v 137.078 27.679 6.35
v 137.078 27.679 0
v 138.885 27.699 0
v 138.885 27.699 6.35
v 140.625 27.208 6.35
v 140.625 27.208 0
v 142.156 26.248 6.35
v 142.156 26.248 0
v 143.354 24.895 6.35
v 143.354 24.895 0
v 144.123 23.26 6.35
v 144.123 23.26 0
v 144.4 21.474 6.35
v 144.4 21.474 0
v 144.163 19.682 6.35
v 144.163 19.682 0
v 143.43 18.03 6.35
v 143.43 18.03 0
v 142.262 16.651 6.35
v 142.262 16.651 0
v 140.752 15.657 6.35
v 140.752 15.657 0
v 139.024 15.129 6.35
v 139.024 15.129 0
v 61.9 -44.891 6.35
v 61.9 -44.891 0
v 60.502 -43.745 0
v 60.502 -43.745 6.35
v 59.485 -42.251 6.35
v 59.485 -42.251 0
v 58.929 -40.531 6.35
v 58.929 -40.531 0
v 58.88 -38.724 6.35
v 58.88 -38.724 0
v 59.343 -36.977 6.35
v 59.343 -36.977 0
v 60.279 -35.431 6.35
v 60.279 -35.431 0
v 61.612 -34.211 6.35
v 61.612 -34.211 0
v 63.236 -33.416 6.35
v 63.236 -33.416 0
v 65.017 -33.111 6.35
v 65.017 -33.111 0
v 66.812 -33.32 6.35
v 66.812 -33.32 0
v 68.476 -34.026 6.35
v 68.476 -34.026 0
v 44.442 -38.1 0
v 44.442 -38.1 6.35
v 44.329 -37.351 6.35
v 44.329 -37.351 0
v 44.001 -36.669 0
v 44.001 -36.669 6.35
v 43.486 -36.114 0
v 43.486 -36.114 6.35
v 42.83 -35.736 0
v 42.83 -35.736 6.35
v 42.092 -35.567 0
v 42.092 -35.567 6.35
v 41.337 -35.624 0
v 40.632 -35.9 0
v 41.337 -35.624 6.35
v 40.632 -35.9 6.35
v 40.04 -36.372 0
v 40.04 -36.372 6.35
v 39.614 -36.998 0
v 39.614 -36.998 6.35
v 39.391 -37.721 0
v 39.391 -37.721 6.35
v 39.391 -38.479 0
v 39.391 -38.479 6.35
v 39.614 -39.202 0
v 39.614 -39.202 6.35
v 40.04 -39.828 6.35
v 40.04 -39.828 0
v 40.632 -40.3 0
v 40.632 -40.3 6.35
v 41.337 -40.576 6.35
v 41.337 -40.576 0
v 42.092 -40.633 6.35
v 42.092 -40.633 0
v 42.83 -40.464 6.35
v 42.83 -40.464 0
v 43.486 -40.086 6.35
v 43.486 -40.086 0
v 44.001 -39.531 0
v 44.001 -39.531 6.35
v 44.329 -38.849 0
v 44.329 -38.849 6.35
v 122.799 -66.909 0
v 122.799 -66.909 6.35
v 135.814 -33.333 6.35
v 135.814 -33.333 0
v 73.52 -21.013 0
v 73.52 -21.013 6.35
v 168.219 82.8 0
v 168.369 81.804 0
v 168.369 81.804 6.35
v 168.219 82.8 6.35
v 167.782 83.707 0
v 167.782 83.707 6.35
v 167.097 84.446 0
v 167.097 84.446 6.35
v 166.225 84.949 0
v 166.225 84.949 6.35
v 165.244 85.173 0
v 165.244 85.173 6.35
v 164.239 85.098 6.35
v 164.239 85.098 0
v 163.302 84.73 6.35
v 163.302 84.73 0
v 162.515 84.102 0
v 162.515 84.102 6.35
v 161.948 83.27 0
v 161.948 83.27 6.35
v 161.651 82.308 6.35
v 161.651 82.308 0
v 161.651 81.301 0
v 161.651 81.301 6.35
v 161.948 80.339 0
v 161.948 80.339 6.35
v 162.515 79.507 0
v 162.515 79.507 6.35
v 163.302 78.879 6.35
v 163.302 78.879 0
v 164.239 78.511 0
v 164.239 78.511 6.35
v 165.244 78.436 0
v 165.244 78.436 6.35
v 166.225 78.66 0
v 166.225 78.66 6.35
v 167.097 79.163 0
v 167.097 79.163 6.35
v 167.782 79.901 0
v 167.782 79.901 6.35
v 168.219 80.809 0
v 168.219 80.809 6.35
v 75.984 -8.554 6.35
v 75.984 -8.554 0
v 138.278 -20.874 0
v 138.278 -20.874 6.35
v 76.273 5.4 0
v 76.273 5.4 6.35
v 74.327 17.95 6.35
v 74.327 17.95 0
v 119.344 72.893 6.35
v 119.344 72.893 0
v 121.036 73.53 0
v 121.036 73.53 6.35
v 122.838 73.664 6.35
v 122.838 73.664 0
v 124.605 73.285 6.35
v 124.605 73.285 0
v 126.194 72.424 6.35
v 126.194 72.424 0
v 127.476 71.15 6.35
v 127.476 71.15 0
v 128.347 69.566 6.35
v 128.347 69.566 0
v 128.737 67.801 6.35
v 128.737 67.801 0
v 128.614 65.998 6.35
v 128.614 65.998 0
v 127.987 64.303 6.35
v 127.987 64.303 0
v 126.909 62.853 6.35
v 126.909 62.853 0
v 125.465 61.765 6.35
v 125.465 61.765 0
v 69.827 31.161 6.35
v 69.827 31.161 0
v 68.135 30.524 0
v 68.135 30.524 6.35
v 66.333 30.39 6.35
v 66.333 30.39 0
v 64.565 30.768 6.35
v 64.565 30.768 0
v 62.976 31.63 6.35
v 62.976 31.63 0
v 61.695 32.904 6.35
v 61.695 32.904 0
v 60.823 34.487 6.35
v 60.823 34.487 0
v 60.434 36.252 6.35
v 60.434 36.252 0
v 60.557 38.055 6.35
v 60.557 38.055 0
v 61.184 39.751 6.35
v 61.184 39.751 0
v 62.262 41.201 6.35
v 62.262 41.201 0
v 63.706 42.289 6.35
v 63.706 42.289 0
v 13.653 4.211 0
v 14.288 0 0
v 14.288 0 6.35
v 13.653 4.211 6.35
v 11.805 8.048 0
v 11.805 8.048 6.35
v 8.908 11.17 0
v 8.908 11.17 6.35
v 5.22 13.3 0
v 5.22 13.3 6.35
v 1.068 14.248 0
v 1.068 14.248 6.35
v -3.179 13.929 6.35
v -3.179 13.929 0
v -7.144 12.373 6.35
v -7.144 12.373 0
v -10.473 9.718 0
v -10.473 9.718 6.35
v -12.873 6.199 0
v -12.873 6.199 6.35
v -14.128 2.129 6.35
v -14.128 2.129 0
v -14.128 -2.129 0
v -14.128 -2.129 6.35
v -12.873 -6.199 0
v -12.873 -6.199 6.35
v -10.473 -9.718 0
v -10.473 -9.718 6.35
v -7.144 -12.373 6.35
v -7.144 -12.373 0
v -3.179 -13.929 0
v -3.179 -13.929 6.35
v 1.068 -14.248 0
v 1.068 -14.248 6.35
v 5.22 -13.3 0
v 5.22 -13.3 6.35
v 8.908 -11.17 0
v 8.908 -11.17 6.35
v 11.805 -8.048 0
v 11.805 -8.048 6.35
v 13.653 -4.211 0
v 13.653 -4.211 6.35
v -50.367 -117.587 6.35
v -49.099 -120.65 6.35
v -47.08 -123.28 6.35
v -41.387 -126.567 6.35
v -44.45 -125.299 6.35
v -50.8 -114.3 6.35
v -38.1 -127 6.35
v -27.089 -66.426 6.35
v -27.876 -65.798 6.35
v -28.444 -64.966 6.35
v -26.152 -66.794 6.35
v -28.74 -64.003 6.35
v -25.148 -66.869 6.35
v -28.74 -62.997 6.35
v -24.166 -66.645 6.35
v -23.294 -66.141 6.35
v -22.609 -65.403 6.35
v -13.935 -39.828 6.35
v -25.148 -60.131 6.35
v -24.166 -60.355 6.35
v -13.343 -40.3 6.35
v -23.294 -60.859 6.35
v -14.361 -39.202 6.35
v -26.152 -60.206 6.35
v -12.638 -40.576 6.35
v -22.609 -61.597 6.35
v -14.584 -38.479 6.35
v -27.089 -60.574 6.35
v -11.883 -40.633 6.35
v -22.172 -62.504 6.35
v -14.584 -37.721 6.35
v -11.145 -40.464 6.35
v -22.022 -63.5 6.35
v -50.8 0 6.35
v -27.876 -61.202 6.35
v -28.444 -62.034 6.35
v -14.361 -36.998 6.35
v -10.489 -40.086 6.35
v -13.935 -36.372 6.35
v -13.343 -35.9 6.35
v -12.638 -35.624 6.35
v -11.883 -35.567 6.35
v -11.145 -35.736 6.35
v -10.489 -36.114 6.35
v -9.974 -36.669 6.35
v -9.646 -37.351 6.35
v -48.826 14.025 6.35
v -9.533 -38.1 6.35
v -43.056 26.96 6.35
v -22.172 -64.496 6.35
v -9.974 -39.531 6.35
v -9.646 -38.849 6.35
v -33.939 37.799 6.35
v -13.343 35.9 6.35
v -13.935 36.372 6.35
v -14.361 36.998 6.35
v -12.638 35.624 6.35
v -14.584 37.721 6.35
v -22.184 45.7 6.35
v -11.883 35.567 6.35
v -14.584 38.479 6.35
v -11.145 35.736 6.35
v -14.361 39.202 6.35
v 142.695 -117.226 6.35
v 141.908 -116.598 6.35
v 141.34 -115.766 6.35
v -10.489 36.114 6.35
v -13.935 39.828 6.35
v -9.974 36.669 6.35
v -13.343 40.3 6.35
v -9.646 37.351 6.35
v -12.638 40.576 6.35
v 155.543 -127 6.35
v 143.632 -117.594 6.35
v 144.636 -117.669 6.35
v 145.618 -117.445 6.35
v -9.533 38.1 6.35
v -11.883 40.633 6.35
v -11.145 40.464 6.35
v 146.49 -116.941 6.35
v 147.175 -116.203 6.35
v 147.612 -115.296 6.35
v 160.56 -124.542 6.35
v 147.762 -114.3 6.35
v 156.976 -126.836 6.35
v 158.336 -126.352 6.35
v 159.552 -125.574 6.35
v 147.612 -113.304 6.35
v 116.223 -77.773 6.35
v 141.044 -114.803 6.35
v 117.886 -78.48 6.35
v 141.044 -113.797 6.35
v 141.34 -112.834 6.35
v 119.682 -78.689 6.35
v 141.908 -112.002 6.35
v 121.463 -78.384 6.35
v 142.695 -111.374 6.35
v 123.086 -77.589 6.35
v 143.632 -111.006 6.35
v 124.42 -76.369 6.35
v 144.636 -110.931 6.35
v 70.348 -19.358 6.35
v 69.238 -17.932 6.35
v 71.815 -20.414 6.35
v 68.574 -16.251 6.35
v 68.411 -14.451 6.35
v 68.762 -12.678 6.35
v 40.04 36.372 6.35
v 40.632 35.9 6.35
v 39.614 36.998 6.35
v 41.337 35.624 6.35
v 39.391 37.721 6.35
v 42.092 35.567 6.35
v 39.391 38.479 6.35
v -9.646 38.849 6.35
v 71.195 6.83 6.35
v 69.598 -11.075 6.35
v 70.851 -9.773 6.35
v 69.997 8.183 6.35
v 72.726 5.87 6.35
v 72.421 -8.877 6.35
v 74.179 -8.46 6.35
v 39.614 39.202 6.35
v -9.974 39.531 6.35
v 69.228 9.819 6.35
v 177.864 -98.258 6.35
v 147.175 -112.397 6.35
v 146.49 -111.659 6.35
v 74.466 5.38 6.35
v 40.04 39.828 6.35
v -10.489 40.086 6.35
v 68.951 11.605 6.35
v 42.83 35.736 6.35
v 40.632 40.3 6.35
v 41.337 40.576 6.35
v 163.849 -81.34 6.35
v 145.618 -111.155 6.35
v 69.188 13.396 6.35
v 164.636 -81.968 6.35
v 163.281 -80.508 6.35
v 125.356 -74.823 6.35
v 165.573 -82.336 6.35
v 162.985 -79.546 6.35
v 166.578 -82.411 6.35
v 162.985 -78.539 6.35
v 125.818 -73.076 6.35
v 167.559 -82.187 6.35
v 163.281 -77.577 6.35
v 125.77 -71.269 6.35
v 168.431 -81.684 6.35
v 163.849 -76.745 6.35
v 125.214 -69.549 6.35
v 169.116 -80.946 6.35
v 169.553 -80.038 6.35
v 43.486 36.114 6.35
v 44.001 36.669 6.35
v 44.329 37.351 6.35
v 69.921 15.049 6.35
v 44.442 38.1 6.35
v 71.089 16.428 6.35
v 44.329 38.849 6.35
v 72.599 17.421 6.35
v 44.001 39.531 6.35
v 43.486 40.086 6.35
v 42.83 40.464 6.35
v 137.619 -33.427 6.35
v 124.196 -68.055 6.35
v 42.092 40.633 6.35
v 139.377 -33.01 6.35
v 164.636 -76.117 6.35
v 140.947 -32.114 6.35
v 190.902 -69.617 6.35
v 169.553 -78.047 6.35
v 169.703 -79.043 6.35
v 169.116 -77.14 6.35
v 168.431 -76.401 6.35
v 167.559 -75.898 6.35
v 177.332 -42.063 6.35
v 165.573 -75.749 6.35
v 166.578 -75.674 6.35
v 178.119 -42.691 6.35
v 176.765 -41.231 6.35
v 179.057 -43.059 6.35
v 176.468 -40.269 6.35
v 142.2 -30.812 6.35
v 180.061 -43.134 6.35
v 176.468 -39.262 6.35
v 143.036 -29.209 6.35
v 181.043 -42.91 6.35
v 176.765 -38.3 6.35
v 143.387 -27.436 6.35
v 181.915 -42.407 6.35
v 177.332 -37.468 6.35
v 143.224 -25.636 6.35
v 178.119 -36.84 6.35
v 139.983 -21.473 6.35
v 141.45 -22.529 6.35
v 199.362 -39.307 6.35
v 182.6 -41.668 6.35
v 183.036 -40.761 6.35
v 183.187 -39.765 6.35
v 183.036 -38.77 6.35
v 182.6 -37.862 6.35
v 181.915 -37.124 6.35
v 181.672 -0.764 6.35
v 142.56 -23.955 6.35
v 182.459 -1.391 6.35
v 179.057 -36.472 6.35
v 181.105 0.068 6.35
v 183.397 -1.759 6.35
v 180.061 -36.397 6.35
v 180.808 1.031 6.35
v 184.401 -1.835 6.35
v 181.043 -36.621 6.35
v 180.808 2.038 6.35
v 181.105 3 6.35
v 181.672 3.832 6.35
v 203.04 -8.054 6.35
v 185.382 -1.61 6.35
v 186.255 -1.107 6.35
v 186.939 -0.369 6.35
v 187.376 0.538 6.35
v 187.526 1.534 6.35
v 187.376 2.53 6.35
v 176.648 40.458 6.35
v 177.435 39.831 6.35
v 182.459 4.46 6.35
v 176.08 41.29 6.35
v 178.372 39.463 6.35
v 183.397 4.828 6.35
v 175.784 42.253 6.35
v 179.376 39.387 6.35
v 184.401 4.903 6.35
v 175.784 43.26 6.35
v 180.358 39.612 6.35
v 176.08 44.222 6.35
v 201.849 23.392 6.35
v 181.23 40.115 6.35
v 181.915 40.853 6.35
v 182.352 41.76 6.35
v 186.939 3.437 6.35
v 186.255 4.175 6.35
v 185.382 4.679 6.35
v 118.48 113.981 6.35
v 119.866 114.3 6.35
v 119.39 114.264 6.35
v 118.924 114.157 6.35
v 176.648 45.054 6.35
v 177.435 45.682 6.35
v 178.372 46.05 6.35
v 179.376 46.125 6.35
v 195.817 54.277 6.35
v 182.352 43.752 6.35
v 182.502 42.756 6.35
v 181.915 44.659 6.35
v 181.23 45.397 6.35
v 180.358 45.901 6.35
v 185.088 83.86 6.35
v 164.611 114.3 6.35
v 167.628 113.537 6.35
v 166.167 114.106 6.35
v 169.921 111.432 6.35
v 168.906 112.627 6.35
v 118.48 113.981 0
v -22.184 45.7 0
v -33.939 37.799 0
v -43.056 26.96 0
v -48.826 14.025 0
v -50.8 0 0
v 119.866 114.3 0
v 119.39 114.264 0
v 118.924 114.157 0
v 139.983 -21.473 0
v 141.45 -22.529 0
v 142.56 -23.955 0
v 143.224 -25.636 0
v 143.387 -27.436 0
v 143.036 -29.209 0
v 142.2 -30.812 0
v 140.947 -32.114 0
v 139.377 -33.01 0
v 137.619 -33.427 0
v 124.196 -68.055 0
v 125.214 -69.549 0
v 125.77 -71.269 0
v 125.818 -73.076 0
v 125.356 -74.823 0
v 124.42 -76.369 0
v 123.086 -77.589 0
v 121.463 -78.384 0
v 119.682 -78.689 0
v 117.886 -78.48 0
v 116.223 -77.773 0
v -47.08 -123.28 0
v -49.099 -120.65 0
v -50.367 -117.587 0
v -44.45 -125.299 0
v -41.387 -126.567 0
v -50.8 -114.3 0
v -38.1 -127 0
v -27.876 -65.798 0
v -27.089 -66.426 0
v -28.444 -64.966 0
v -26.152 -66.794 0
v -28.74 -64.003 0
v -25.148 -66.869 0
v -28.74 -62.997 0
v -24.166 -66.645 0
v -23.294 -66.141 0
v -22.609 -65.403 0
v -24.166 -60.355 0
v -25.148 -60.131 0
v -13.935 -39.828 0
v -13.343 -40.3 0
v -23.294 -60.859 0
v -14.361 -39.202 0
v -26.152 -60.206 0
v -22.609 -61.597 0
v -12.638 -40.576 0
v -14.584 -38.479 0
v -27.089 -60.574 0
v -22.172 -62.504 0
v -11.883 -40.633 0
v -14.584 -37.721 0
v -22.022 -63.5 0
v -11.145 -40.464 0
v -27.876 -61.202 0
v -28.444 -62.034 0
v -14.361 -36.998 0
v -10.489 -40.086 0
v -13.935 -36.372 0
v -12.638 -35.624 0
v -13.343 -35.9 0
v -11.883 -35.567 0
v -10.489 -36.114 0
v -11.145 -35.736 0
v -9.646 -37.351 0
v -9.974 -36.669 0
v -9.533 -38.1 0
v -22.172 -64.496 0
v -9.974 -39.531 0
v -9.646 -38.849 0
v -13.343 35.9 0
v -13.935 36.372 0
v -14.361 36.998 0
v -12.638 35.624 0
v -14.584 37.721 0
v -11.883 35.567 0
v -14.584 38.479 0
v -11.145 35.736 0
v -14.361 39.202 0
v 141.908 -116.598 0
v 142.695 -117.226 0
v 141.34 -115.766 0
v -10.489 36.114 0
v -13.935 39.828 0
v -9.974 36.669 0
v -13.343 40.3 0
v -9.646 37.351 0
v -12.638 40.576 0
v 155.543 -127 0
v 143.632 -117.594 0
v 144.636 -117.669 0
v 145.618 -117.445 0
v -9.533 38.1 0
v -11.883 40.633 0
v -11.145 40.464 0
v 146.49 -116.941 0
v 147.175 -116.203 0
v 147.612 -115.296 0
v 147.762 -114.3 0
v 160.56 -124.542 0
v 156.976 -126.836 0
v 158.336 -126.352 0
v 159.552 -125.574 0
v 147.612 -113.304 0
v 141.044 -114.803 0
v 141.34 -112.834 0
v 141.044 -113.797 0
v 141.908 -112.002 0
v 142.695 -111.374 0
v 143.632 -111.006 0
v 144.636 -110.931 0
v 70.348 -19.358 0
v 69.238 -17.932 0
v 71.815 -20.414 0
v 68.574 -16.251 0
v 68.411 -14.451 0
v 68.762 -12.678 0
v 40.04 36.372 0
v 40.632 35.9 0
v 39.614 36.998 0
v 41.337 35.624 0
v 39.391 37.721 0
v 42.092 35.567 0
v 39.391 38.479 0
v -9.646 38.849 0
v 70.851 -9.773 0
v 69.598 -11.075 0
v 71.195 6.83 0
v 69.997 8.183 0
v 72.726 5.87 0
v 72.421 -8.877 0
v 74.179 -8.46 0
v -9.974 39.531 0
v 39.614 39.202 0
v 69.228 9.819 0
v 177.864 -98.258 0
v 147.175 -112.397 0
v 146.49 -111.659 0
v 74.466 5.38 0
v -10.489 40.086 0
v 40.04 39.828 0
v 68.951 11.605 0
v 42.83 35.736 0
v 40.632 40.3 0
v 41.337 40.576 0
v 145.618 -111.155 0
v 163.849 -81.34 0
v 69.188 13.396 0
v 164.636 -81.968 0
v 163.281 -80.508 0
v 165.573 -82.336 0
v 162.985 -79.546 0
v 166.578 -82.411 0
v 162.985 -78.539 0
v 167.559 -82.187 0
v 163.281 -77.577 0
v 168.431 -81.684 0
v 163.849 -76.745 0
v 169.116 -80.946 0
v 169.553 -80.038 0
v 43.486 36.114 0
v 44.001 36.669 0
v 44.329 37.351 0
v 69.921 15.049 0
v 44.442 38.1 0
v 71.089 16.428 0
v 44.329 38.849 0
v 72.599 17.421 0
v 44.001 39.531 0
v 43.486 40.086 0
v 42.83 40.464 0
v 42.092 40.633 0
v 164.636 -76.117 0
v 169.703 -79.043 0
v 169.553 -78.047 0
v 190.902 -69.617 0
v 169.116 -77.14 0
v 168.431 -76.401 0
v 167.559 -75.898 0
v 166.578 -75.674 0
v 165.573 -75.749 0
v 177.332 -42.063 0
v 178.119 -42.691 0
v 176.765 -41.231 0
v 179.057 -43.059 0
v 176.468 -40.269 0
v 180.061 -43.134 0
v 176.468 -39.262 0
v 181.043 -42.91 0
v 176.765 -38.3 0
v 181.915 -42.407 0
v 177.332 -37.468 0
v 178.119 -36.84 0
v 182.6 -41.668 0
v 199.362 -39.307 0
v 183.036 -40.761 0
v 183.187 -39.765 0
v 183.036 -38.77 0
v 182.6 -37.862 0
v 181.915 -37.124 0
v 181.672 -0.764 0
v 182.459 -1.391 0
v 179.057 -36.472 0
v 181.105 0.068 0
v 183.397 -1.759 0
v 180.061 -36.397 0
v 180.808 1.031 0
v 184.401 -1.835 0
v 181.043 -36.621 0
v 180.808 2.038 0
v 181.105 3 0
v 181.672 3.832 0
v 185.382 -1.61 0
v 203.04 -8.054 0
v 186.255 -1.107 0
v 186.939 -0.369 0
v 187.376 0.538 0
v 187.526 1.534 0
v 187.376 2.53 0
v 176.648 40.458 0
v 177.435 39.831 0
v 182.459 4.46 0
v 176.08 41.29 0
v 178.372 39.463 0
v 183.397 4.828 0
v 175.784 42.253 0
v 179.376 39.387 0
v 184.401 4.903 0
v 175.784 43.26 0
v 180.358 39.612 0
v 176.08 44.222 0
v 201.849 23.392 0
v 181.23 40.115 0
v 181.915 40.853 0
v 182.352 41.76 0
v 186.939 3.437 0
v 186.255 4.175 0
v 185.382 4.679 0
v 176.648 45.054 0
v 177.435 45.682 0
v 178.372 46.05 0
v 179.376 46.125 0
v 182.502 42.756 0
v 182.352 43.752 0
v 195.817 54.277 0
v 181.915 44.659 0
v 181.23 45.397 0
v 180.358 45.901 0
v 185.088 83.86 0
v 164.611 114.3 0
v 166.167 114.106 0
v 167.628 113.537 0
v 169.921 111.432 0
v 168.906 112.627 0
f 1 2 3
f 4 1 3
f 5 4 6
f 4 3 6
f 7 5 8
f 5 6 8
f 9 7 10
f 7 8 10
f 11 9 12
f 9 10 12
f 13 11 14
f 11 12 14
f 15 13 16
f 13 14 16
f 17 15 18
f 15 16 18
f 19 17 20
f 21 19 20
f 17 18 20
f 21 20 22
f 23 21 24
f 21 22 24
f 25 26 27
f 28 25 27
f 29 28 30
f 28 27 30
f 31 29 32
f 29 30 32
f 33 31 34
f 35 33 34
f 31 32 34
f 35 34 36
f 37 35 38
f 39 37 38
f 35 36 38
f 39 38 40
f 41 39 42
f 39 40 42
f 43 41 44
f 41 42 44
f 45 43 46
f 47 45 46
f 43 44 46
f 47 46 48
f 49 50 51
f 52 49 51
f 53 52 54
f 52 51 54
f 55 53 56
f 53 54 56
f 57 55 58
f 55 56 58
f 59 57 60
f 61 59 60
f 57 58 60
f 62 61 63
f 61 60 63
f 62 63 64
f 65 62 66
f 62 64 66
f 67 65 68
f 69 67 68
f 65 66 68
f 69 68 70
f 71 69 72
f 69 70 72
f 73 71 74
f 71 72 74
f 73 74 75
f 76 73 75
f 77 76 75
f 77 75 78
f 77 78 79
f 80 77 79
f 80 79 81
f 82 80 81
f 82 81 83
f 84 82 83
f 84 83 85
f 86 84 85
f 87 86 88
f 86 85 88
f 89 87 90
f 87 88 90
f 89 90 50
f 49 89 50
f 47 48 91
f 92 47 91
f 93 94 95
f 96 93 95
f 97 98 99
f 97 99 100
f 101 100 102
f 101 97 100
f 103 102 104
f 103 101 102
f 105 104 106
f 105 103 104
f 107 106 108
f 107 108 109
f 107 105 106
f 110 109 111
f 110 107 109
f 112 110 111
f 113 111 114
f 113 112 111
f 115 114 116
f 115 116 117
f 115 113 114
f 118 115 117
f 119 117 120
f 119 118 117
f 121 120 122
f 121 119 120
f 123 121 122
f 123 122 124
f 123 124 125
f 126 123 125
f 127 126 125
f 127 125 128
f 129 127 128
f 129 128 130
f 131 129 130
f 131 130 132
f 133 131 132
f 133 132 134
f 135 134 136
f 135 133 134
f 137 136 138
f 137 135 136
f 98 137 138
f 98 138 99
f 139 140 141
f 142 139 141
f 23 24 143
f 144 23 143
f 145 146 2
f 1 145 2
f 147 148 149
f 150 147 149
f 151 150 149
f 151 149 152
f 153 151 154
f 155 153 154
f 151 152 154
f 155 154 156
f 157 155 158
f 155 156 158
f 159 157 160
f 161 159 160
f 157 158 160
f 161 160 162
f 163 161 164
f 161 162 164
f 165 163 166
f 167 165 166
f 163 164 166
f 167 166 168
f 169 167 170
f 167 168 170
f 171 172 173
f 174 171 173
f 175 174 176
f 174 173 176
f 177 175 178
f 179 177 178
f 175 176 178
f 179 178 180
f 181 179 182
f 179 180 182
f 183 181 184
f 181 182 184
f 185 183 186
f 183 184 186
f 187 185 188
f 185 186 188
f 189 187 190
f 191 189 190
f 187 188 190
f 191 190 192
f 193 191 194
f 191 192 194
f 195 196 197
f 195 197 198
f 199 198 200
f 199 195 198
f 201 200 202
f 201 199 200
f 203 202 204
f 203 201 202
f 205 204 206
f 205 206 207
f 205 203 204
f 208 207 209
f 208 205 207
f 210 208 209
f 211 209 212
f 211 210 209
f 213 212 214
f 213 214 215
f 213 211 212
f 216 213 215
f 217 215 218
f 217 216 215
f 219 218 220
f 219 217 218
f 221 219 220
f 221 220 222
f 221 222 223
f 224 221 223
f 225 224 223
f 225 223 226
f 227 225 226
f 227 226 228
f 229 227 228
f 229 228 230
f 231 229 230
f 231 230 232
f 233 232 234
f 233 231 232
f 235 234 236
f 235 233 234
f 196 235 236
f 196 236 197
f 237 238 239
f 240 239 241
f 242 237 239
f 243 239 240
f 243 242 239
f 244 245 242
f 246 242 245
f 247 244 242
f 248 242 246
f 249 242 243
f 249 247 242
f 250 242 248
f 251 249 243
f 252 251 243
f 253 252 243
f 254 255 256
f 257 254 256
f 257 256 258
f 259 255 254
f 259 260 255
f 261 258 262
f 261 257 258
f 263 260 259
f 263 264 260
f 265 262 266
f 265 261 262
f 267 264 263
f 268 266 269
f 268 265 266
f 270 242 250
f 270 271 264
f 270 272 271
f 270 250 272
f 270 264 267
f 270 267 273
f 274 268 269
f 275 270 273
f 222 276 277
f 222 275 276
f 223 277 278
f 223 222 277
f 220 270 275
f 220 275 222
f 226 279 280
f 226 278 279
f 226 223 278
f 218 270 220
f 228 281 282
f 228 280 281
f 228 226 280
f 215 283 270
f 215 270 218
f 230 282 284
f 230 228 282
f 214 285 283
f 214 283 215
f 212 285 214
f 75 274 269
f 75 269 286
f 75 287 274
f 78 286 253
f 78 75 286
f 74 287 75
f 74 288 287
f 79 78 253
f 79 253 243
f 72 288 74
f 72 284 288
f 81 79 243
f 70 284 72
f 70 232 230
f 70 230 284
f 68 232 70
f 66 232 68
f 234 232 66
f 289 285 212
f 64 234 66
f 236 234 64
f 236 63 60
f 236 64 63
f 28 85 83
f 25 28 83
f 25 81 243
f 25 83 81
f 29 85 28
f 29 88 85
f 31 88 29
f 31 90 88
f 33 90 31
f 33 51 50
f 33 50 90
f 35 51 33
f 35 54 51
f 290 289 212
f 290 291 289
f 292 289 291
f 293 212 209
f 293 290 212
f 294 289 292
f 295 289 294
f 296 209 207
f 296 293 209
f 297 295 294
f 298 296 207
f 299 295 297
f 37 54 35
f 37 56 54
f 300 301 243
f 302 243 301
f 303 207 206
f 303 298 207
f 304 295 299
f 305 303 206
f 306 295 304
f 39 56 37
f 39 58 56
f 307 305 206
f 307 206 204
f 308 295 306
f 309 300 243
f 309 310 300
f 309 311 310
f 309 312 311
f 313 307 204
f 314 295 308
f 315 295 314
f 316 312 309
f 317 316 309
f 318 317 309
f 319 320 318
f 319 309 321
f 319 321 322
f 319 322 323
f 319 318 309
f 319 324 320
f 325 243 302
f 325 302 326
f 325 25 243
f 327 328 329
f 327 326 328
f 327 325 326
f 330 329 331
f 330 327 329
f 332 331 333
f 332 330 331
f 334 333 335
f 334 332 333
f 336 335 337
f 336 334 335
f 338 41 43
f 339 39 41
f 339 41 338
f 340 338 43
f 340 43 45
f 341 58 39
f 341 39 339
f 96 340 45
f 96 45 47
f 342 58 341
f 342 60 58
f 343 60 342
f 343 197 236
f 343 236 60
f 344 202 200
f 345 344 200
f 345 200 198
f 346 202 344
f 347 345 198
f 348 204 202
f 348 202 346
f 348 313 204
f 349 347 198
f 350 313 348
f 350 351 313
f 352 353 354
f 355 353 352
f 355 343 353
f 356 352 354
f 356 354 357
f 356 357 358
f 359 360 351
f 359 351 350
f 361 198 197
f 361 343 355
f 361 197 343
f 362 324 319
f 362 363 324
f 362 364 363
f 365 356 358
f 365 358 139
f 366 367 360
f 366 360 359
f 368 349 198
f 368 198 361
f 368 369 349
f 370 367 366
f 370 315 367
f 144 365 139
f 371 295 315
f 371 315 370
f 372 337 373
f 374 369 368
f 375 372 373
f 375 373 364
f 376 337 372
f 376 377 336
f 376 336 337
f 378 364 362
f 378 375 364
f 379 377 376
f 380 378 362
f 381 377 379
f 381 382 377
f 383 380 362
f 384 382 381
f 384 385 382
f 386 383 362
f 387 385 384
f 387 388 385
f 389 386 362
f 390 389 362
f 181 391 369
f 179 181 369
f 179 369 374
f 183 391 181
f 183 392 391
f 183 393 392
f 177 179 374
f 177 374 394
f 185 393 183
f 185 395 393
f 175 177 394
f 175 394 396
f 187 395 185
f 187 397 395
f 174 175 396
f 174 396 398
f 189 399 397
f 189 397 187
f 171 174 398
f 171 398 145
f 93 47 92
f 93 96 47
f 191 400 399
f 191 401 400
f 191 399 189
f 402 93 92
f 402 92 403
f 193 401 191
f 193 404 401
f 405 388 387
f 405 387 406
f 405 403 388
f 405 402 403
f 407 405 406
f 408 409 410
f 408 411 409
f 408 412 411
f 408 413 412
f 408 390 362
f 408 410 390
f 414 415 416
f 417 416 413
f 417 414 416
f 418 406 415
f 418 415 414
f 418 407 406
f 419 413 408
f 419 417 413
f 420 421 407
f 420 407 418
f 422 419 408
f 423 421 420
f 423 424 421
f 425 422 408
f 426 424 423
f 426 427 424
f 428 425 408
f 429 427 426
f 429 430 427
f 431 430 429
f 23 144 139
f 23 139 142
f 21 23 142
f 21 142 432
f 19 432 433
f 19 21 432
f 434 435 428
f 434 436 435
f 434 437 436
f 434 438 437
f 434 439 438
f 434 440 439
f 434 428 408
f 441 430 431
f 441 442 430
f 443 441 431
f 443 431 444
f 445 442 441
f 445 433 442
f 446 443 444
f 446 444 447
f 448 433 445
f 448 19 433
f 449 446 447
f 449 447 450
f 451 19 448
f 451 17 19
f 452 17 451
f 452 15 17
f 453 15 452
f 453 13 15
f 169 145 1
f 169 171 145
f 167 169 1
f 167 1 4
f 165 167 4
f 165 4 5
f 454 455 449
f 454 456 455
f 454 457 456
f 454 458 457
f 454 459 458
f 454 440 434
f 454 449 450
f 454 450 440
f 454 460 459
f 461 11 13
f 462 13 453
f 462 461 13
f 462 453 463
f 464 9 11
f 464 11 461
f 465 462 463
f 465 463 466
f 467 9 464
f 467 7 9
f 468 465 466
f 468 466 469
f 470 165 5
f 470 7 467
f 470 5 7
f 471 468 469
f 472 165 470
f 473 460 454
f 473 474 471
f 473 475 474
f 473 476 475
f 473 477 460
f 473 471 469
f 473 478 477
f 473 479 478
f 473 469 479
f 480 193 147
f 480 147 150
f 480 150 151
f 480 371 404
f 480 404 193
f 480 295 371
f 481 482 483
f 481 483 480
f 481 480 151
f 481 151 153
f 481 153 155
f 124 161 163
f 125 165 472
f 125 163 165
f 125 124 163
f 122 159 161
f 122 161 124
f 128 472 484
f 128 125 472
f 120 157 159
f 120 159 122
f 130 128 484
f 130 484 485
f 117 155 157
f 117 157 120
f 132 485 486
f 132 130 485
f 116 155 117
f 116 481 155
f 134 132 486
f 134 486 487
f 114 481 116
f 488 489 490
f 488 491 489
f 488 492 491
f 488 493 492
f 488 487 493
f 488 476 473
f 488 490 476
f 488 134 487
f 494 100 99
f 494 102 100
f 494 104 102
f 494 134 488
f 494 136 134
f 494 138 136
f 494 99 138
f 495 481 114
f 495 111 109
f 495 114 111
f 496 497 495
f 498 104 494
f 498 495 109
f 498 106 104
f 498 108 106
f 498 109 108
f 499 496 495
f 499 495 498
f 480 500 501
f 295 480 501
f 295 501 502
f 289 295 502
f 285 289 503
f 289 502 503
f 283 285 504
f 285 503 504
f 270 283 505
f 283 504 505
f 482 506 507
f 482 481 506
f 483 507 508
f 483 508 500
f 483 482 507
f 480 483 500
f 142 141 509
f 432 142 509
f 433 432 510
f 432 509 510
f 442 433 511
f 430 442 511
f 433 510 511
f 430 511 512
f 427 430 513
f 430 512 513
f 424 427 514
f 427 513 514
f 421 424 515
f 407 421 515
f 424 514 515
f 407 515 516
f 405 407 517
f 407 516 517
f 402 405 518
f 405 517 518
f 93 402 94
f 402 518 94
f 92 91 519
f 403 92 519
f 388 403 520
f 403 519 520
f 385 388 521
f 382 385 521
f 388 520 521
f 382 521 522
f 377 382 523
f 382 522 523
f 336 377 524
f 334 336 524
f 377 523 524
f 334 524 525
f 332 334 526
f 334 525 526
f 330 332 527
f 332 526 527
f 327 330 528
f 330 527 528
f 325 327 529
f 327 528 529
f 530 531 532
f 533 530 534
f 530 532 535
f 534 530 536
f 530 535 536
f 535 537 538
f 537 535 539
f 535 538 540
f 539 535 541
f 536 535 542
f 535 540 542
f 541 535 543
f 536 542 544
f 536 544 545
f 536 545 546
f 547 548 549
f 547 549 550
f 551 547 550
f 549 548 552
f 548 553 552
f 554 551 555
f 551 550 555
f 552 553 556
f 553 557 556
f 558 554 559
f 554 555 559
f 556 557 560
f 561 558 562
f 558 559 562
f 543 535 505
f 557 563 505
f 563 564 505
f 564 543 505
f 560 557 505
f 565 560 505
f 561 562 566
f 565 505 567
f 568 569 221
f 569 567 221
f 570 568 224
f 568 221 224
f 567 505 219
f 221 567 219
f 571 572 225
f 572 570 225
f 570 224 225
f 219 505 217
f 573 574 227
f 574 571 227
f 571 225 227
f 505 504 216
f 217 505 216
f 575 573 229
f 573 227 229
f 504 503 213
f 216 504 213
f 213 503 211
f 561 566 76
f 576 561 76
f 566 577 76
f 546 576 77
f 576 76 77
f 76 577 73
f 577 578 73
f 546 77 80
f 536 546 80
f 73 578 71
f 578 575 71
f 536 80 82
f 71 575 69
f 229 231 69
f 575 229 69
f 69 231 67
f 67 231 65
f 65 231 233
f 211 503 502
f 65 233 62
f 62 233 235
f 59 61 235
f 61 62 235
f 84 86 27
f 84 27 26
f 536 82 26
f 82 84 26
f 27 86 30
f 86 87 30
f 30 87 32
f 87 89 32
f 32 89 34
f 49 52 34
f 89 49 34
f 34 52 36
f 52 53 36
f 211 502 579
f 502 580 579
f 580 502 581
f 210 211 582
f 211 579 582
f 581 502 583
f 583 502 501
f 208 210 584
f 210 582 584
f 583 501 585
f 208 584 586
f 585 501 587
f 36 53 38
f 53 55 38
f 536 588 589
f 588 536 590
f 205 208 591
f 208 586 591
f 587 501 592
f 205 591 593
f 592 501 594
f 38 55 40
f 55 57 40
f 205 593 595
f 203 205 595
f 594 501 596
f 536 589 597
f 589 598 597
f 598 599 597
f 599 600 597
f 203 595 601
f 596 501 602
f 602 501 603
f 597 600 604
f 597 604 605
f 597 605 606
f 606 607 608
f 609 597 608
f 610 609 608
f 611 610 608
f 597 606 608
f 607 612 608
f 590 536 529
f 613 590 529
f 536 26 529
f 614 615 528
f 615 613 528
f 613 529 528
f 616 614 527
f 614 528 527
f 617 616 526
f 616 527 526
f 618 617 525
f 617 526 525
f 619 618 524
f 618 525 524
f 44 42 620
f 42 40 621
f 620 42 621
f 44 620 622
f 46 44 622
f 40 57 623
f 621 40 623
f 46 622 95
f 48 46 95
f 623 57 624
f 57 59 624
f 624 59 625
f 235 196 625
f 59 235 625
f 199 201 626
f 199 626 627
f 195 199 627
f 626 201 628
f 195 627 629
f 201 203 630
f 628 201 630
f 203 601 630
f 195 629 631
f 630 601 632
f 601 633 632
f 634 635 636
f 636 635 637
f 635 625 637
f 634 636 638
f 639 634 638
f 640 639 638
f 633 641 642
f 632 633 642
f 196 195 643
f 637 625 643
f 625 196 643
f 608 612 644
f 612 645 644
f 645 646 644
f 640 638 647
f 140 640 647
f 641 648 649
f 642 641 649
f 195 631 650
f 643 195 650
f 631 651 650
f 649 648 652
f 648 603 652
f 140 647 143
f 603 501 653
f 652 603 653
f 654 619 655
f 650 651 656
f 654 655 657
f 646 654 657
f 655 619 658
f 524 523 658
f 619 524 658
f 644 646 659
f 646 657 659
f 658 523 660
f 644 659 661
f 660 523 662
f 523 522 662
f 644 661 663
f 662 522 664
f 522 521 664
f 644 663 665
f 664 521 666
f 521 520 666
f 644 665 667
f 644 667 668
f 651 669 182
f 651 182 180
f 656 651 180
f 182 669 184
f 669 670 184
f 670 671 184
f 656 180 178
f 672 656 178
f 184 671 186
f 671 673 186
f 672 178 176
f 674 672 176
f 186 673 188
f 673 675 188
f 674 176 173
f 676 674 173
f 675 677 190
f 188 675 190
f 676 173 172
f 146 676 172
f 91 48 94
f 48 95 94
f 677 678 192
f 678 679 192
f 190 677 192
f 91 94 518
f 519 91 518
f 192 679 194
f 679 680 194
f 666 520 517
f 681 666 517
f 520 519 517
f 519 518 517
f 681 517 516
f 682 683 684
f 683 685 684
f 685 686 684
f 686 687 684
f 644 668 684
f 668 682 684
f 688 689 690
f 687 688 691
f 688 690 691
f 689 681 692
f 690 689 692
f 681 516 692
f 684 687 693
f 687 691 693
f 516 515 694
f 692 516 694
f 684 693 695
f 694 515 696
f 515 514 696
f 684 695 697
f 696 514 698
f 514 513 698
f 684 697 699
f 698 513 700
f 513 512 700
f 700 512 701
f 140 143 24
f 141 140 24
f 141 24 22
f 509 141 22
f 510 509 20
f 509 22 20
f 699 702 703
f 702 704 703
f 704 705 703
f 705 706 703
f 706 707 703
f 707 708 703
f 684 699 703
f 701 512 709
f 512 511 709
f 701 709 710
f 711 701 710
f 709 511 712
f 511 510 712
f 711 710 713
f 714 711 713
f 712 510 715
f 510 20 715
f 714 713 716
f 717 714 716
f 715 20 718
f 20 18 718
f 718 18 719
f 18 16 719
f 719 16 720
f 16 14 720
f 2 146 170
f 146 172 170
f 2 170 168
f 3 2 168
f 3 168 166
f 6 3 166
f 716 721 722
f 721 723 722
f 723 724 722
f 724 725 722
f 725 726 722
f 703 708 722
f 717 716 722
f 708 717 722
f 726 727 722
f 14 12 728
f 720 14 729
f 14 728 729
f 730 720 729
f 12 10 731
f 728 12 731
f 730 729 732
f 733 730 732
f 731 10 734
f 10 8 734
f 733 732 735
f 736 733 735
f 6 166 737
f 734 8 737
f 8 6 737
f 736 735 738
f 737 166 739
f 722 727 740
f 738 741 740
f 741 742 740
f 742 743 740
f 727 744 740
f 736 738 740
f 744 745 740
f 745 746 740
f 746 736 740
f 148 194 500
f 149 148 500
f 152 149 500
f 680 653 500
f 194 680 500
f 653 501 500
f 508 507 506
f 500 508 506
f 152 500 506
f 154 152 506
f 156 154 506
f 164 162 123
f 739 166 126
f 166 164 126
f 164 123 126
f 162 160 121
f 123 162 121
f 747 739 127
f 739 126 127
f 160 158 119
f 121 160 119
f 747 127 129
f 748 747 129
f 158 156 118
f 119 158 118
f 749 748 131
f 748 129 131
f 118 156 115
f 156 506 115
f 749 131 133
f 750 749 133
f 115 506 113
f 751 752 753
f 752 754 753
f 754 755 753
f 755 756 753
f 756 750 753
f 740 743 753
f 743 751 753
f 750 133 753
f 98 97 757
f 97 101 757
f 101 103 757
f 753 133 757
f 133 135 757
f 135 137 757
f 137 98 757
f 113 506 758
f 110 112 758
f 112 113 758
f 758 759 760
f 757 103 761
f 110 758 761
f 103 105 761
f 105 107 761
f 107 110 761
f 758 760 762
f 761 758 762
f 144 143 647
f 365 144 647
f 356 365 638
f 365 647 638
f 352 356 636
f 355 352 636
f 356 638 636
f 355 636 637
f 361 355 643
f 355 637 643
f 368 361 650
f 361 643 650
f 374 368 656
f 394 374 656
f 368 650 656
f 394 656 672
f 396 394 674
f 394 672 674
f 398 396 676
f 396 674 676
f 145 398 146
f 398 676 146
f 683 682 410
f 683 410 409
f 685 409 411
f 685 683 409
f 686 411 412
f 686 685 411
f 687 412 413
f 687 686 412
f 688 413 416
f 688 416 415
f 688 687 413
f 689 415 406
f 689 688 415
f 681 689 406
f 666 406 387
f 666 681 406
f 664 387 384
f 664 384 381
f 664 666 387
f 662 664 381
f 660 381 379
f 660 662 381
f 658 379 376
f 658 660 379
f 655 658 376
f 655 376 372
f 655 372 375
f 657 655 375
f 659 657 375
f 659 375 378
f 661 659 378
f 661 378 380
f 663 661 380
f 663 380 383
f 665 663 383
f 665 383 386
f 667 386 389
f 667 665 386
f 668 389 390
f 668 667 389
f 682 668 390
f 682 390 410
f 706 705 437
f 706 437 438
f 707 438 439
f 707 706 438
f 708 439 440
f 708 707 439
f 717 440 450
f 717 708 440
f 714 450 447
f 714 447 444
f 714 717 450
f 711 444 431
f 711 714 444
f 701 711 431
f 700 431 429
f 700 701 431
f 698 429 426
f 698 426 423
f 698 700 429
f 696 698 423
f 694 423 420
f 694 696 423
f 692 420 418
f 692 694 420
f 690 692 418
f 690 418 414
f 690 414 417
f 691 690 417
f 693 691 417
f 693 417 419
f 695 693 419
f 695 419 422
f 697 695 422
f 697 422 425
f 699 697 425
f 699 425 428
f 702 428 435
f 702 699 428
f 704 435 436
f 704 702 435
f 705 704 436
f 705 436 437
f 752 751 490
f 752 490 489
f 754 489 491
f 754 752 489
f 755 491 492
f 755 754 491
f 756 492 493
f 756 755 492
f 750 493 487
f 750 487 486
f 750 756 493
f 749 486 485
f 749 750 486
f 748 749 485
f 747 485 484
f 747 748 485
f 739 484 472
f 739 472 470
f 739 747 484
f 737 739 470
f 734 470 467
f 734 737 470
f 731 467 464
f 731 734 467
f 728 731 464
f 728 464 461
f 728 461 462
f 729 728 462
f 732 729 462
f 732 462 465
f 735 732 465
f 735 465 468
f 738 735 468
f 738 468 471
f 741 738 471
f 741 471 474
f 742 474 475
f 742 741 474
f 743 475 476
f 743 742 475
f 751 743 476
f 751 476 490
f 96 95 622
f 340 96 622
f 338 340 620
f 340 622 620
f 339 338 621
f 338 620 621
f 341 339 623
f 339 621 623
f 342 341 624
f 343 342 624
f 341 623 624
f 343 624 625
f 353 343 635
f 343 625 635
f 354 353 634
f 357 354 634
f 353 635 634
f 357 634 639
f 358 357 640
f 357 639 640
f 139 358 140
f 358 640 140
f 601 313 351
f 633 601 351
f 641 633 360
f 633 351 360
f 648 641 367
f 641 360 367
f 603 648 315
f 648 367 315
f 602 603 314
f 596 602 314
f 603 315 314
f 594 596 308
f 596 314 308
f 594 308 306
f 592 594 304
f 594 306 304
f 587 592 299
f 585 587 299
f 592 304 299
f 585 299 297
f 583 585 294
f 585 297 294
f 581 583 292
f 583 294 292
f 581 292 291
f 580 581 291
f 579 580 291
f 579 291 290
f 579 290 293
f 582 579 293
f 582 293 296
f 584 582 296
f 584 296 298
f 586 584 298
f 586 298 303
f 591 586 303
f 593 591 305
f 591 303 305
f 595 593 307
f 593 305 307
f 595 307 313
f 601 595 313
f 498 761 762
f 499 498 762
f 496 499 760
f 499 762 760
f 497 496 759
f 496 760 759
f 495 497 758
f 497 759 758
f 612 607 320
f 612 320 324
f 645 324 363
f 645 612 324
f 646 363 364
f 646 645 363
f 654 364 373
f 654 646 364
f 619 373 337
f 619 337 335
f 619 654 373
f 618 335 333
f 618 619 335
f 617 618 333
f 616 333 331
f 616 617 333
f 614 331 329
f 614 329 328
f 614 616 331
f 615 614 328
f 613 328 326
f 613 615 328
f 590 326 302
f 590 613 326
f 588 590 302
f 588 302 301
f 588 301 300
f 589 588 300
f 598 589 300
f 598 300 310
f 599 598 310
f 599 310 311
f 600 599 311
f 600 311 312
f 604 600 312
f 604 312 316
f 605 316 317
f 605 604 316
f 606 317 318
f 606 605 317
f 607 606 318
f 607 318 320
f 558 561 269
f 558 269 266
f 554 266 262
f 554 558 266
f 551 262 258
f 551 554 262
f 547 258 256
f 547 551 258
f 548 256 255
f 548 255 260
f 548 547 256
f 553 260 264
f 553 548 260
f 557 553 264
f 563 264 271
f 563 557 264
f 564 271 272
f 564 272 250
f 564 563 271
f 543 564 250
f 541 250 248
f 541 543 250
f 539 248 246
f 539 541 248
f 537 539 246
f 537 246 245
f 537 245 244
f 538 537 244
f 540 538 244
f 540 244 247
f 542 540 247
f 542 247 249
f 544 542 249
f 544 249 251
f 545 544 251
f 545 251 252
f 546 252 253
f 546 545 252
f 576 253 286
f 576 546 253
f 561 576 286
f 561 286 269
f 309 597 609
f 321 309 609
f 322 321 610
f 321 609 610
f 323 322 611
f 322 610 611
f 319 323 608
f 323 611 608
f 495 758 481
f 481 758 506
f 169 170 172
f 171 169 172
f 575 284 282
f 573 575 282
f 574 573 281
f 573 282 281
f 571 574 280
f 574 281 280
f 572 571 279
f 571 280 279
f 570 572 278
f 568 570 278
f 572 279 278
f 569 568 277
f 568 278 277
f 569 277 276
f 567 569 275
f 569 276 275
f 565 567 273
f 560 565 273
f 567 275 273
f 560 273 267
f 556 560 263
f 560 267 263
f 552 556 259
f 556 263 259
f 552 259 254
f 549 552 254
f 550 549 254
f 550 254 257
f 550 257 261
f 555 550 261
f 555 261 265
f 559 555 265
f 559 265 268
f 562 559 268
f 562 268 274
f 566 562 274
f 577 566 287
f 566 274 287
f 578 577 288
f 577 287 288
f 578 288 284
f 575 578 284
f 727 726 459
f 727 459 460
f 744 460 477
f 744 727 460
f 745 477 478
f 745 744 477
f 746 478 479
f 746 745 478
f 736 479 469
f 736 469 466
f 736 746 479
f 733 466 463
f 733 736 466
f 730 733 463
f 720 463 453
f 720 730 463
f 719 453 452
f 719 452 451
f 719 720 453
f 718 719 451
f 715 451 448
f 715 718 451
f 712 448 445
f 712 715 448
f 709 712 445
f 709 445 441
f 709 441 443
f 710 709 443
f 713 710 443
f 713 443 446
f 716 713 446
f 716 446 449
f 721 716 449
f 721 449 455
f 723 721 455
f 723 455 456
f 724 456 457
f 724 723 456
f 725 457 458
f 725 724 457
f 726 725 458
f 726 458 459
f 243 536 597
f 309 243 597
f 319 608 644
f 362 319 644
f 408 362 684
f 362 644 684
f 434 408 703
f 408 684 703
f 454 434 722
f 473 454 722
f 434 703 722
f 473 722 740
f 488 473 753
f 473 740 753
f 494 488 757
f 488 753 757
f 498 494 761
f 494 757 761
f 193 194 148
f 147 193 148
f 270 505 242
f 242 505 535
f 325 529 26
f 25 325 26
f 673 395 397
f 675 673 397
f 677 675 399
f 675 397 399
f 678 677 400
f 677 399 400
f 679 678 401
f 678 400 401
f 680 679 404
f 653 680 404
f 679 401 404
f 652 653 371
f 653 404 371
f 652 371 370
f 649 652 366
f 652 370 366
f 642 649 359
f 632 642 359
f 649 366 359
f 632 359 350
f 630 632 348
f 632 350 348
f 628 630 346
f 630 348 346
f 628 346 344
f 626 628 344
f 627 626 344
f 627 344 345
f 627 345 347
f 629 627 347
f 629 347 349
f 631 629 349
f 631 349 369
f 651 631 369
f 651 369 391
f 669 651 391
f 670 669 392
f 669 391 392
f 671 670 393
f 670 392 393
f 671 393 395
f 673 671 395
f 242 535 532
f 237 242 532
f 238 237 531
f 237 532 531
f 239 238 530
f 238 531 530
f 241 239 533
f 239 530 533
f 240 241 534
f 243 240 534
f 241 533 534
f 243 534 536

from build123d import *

# Parameters (mm, degrees)
SKETCH1_R           = 3.3782
SKETCH1_R_2         = 14.2875
BOSS_EXTRUDE1_DEPTH = 6.35
FILLET1_R           = 3.175
SKETCH2_R           = 2.54
CUT_EXTRUDE1_DEPTH  = 6.35


with BuildPart() as part:
    # Sketch1 → Boss-Extrude1 (new body)
    with BuildSketch(Plane.XY):
        with BuildLine():
            ThreePointArc((155.542598667, -127), (158.336226208, -126.352468339), (160.56010185, -124.541935484))
            ThreePointArc((160.56010185, -124.541935484), (203.040311847, -8.054301034), (169.920839989, 111.432258065))
            ThreePointArc((169.920839989, 111.432258065), (167.628276357, 113.537255082), (164.61081374, 114.3))
            Line((164.61081374, 114.3), (119.1365603, 114.3))
            Line((119.1365603, 114.3), (-22.183826694, 45.70030452))
            ThreePointArc((-22.183826694, 45.70030452), (-43.055652335, 26.960170659), (-50.8, 0))
            Line((-50.8, 0), (-50.8, -114.3))
            ThreePointArc((-50.8, -114.3), (-47.080256121, -123.280256121), (-38.1, -127))
            Line((-38.1, -127), (155.542598667, -127))
        make_face()
        with Locations((144.383975911, -114.3)):
            Circle(SKETCH1_R, mode=Mode.SUBTRACT)
        with Locations((166.325065928, -79.042592339)):
            Circle(SKETCH1_R, mode=Mode.SUBTRACT)
        with Locations((179.808375328, -39.76541584)):
            Circle(SKETCH1_R, mode=Mode.SUBTRACT)
        with Locations((184.148262492, 1.5342404)):
            Circle(SKETCH1_R, mode=Mode.SUBTRACT)
        with Locations((179.124039222, 42.756241887)):
            Circle(SKETCH1_R, mode=Mode.SUBTRACT)
        with Locations((164.991192987, 81.804402963)):
            Circle(SKETCH1_R, mode=Mode.SUBTRACT)
        with BuildLine():
            Line((63.70579448, 42.288701206), (119.344293443, 72.892743964))
            ThreePointArc((119.344293443, 72.892743964), (127.968547615, 70.389298344), (125.465101994, 61.765044172))
            Line((125.465101994, 61.765044172), (69.826603031, 31.161001414))
            ThreePointArc((69.826603031, 31.161001414), (61.202348859, 33.664447034), (63.70579448, 42.288701206))
        make_face(mode=Mode.SUBTRACT)
        with BuildLine():
            ThreePointArc((61.899520347, -44.891111378), (59.755440765, -36.170565366), (68.475986777, -34.026485785))
            Line((68.475986777, -34.026485785), (122.799114746, -66.908817936))
            ThreePointArc((122.799114746, -66.908817936), (124.943194328, -75.629363948), (116.222648316, -77.77344353))
            Line((116.222648316, -77.77344353), (61.899520347, -44.891111378))
        make_face(mode=Mode.SUBTRACT)
        with BuildLine():
            ThreePointArc((73.520186848, -21.01296328), (68.52280869, -13.551648949), (75.984123021, -8.554270791))
            Line((75.984123021, -8.554270791), (138.277585466, -20.873951654))
            ThreePointArc((138.277585466, -20.873951654), (143.274963624, -28.335265985), (135.813649293, -33.332644143))
            Line((135.813649293, -33.332644143), (73.520186848, -21.01296328))
        make_face(mode=Mode.SUBTRACT)
        with BuildLine():
            ThreePointArc((76.273233773, 5.399658308), (69.025314597, 10.701796332), (74.327452622, 17.949715507))
            Line((74.327452622, 17.949715507), (137.077738619, 27.678621264))
            ThreePointArc((137.077738619, 27.678621264), (144.325657795, 22.37648324), (139.02351977, 15.128564064))
            Line((139.02351977, 15.128564064), (76.273233773, 5.399658308))
        make_face(mode=Mode.SUBTRACT)
        Circle(SKETCH1_R_2, mode=Mode.SUBTRACT)
        with Locations((-25.4, -63.5)):
            Circle(SKETCH1_R, mode=Mode.SUBTRACT)
    extrude(amount=BOSS_EXTRUDE1_DEPTH)

    # Fillet1
    fillet1_edges = [part.edges().sort_by_distance(p)[0] for p in [
        (119.1365603, 114.3, 3.175),
    ]]
    fillet(fillet1_edges, radius=FILLET1_R)

    # Sketch2 → Cut-Extrude1 (cut)
    with BuildSketch(Plane.XY.offset(6.35)):
        with Locations((-12.072682951, 38.1)):
            Circle(SKETCH2_R)
        with Locations((-12.072682951, -38.1)):
            Circle(SKETCH2_R)
        with Locations((41.902317049, -38.1)):
            Circle(SKETCH2_R)
        with Locations((41.902317049, 38.1)):
            Circle(SKETCH2_R)
    extrude(amount=-CUT_EXTRUDE1_DEPTH, mode=Mode.SUBTRACT)


solid = part.part
